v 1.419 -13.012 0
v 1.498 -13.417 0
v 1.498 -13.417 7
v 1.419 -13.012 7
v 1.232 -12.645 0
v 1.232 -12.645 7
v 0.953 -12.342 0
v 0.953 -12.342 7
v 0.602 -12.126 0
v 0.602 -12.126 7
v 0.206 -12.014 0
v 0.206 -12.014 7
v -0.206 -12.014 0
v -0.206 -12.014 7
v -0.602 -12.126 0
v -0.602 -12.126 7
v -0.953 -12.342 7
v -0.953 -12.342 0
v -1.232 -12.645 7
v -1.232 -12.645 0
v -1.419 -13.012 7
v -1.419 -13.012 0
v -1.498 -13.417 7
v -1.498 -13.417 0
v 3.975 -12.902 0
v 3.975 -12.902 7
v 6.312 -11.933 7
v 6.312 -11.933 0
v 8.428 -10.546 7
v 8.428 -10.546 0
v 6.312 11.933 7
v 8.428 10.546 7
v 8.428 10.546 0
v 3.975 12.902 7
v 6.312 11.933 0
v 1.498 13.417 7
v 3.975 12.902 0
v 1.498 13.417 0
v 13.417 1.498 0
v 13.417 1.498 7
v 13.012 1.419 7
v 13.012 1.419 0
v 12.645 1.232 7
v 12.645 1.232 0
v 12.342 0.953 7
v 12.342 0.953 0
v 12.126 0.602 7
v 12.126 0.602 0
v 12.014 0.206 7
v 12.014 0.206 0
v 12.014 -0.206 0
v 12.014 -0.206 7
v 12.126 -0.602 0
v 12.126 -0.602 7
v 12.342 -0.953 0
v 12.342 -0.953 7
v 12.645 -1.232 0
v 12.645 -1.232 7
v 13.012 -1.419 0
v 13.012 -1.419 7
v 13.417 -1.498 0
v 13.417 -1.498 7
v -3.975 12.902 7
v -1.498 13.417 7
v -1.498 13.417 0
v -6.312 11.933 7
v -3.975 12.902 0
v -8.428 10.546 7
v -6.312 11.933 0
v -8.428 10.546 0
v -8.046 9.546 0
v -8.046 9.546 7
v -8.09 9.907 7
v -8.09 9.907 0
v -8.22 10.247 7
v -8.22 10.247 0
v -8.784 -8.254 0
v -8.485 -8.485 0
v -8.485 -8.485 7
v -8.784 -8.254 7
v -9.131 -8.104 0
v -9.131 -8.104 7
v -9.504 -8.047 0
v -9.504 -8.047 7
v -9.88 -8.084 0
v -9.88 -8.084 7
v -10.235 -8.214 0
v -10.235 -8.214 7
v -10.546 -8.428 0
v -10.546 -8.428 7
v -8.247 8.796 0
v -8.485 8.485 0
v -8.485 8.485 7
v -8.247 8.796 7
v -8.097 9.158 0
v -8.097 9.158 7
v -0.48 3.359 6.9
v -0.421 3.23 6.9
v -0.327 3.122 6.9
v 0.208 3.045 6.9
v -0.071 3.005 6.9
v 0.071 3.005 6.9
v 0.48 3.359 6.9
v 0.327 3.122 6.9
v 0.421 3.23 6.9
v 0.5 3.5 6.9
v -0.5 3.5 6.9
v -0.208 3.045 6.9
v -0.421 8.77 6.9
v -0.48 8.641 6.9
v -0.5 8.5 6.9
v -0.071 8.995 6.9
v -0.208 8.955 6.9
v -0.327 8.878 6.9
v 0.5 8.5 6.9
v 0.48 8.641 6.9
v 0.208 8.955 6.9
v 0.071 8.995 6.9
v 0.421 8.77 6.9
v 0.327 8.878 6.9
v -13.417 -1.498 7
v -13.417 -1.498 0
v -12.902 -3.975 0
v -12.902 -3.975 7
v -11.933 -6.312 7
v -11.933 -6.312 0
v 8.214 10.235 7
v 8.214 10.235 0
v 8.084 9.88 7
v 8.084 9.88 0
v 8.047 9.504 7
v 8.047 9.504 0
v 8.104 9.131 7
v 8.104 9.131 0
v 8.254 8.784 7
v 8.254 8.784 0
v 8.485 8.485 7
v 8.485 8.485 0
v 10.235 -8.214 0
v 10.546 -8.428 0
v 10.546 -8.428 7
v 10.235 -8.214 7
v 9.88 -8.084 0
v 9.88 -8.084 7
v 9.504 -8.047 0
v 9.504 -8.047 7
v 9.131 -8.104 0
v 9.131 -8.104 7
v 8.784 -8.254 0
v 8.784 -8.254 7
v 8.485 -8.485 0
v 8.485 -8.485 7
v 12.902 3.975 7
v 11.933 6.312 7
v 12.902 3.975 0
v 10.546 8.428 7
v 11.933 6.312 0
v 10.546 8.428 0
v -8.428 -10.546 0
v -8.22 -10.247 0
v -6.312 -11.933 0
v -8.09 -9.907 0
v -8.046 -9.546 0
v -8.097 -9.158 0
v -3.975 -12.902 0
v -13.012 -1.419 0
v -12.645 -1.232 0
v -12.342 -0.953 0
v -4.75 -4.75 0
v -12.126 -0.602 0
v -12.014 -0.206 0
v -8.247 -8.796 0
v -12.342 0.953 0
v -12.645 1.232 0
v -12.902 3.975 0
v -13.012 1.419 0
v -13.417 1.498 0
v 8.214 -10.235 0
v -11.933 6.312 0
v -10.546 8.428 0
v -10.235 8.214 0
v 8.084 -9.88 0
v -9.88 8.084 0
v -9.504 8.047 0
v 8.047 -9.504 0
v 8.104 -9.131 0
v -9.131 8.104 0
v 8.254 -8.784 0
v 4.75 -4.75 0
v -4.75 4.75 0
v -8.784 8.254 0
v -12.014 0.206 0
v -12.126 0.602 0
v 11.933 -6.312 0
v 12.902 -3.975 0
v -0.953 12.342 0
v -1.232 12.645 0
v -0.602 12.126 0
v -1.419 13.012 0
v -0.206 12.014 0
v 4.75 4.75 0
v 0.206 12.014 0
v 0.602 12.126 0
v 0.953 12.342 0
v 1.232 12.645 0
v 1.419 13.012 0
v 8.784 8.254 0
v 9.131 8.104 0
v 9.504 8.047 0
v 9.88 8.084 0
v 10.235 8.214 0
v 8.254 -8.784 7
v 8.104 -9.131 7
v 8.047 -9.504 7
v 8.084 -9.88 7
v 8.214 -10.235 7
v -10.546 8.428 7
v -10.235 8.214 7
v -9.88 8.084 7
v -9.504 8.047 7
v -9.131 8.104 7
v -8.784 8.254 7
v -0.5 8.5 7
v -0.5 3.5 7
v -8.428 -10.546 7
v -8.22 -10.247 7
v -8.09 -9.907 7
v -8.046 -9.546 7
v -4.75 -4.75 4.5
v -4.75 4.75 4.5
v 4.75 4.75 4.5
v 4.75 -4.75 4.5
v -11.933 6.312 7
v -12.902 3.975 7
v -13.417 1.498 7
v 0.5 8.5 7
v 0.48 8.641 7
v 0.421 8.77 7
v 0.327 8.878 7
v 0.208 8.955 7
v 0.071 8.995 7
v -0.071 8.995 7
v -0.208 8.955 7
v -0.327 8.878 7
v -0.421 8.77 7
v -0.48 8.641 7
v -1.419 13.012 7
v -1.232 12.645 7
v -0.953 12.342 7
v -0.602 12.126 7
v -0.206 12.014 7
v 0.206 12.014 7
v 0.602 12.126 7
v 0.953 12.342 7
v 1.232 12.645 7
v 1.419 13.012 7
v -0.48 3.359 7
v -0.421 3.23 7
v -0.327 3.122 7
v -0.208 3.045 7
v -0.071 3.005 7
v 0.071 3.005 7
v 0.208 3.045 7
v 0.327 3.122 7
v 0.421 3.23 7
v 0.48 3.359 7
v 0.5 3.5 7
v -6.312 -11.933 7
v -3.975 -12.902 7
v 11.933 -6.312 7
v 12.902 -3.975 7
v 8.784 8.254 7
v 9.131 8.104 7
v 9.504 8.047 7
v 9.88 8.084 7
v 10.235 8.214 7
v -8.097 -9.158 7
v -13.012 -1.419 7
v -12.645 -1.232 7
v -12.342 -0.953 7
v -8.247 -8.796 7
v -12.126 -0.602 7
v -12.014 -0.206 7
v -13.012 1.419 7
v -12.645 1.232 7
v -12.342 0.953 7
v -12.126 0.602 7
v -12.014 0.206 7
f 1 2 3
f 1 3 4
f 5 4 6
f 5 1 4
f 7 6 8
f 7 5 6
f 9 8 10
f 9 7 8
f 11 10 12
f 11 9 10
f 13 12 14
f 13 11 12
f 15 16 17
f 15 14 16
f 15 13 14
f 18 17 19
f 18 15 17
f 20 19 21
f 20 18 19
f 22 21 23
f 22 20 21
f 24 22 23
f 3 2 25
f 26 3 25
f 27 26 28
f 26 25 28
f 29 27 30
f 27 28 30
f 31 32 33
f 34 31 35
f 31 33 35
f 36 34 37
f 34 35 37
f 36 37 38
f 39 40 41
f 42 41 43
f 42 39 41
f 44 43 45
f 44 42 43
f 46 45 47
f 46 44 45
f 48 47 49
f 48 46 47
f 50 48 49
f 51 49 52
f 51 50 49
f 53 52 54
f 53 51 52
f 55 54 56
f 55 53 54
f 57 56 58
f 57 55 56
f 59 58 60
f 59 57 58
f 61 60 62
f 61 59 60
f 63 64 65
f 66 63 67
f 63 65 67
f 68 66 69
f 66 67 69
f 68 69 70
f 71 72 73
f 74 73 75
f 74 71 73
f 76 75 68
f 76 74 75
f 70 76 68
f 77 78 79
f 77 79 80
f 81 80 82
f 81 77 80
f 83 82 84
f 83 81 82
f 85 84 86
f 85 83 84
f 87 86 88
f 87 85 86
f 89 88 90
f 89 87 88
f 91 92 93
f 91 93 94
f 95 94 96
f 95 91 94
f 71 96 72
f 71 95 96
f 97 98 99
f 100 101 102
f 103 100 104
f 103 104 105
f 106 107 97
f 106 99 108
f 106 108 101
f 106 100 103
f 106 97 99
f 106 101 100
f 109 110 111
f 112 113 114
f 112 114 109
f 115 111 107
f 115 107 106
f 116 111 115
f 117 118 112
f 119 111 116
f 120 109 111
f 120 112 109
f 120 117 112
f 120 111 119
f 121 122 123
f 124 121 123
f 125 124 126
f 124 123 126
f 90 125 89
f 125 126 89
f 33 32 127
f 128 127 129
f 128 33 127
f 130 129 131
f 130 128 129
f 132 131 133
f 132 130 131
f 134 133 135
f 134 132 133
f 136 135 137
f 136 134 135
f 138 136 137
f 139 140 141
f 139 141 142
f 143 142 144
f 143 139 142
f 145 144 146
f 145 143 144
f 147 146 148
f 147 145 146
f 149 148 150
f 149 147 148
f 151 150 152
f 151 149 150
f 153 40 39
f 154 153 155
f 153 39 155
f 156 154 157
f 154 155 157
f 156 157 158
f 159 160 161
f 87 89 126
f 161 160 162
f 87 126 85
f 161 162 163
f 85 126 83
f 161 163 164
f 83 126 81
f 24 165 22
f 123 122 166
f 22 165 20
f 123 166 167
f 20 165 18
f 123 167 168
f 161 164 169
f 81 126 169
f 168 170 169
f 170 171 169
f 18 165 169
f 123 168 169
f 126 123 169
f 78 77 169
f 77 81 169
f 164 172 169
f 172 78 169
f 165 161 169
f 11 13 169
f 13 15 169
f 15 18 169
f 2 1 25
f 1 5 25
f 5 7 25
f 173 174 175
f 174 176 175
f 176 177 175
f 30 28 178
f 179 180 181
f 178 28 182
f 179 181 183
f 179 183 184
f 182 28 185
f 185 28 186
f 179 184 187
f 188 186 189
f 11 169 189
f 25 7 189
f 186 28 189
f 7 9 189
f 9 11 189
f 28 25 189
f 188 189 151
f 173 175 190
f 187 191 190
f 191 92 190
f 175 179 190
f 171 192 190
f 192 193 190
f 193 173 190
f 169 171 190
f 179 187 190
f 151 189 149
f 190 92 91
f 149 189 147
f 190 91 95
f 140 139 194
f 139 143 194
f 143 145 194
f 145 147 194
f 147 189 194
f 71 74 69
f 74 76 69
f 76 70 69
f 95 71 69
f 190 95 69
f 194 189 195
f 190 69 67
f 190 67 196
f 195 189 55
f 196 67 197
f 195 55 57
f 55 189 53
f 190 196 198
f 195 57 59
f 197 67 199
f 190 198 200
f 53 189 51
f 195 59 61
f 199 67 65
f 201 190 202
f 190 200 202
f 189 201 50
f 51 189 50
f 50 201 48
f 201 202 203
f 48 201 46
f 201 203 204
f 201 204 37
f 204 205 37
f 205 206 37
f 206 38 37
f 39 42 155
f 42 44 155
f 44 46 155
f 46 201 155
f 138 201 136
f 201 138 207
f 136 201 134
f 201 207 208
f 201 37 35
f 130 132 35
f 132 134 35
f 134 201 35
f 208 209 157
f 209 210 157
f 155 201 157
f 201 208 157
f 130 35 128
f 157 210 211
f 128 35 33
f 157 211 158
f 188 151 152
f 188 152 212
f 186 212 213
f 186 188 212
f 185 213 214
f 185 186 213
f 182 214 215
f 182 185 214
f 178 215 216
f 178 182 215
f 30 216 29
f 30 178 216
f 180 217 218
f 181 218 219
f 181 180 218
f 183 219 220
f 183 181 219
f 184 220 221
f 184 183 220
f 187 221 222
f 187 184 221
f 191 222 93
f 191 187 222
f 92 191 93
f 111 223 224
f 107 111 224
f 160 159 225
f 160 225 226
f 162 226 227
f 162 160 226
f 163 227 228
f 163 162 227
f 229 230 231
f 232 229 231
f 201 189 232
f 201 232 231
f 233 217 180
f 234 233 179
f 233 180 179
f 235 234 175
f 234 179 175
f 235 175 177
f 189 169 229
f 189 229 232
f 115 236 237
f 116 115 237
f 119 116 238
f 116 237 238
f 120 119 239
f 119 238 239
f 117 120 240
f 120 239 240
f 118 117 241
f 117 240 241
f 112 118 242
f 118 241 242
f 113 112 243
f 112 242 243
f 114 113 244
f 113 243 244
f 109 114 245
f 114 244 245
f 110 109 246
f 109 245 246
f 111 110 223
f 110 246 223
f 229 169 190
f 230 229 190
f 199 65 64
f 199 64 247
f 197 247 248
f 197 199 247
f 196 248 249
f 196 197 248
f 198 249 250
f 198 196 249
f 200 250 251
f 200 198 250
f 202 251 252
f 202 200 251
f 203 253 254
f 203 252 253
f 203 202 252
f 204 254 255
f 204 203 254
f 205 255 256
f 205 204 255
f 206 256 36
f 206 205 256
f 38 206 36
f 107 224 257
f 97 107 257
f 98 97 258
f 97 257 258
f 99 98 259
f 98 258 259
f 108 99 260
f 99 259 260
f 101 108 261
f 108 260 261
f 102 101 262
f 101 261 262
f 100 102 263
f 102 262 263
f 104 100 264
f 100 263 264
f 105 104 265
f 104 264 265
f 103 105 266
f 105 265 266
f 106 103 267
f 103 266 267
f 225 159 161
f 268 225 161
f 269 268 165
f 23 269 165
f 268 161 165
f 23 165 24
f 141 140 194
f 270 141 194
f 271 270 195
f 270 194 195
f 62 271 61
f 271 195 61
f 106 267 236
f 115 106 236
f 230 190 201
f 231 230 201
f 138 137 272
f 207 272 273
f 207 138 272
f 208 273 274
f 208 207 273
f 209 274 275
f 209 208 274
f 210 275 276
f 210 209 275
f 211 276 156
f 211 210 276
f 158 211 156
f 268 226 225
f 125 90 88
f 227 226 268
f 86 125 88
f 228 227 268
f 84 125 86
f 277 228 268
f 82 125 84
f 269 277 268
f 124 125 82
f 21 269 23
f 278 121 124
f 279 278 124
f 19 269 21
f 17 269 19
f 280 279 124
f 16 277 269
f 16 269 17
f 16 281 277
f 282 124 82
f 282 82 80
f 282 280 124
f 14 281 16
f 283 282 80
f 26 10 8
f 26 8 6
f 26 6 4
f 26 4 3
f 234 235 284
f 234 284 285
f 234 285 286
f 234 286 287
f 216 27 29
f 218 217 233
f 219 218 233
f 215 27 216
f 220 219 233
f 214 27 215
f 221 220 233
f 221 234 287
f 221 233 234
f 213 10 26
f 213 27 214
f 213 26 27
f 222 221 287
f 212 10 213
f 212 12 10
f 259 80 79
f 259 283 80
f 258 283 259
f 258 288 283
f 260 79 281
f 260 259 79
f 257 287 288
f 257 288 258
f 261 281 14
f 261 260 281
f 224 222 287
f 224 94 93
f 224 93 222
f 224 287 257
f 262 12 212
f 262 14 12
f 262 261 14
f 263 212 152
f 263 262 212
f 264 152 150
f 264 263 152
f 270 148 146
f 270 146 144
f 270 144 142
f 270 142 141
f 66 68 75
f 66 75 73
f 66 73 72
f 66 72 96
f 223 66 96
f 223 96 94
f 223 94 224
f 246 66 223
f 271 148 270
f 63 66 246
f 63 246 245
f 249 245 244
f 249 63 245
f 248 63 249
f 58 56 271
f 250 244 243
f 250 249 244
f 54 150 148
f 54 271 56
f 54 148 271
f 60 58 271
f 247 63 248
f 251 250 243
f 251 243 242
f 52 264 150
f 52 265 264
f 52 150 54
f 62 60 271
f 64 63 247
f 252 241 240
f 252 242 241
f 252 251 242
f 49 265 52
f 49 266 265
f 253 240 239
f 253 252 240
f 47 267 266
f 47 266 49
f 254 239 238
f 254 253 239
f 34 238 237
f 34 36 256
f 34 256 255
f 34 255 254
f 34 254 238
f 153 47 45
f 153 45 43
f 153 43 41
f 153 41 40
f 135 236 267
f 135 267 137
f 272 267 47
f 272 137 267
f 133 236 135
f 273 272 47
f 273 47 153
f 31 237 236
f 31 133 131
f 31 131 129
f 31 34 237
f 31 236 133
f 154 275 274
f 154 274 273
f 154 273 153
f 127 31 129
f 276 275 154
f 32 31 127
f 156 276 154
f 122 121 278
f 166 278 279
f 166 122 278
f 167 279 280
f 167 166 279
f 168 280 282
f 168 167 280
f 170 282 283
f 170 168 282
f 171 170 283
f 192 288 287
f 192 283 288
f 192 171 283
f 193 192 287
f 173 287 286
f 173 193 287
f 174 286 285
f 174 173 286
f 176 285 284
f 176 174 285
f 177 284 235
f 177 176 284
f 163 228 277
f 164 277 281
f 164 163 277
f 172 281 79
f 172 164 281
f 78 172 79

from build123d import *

# Parameters (mm, degrees)
F0_R     = 13.5
F1_DEPTH = 7
F2_W     = 9.5
F2_H     = 9.5
F3_DEPTH = 4.5
F4_R     = 1.5
F5_DEPTH = 25.4
F8_DEPTH = 0.1


with BuildPart() as f1:
    # F0 (on Top) → F1 (new body)
    with BuildSketch(Plane.XY):
        Circle(F0_R)
    extrude(amount=F1_DEPTH)

    # F2 (on Top) → F3 (cut)
    with BuildSketch(Plane.XY):
        Rectangle(F2_W, F2_H)
    extrude(amount=F3_DEPTH, mode=Mode.SUBTRACT)

    # F4 (on Top) → F5 (cut)
    with BuildSketch(Plane.XY):
        with Locations((13.5, 0)):
            Circle(F4_R)
        with Locations((-13.5, 0)):
            Circle(F4_R)
        with Locations((0, -13.5)):
            Circle(F4_R)
        with Locations((0, 13.5)):
            Circle(F4_R)
        with BuildLine():
            ThreePointArc((-8.045941546, 9.545941546), (-8.9719163975, 10.9317608448), (-10.6066017178, 10.6066017178))
            Line((-10.6066017178, 10.6066017178), (-8.4852813742, 8.4852813742))
            ThreePointArc((-8.4852813742, 8.4852813742), (-8.1601222473, 8.9719163975), (-8.045941546, 9.545941546))
        make_face()
        with BuildLine():
            ThreePointArc((10.6066017178, 10.6066017178), (8.4852813742, 10.6066017178), (8.4852813742, 8.4852813742))
            Line((8.4852813742, 8.4852813742), (10.6066017178, 10.6066017178))
        make_face()
        with BuildLine():
            Line((10.6066017178, 10.6066017178), (8.4852813742, 8.4852813742))
            ThreePointArc((8.4852813742, 8.4852813742), (10.1199666946, 8.1601222473), (11.045941546, 9.545941546))
            ThreePointArc((11.045941546, 9.545941546), (10.9317608448, 10.1199666946), (10.6066017178, 10.6066017178))
        make_face()
        with BuildLine():
            ThreePointArc((11.045941546, -9.545941546), (10.1199666946, -8.1601222473), (8.4852813742, -8.4852813742))
            Line((8.4852813742, -8.4852813742), (10.6066017178, -10.6066017178))
            ThreePointArc((10.6066017178, -10.6066017178), (10.9317608448, -10.1199666946), (11.045941546, -9.545941546))
        make_face()
        with BuildLine():
            Line((10.6066017178, -10.6066017178), (8.4852813742, -8.4852813742))
            ThreePointArc((8.4852813742, -8.4852813742), (8.4852813742, -10.6066017178), (10.6066017178, -10.6066017178))
        make_face()
        with BuildLine():
            ThreePointArc((-8.045941546, -9.545941546), (-8.1601222473, -8.9719163975), (-8.4852813742, -8.4852813742))
            Line((-8.4852813742, -8.4852813742), (-10.6066017178, -10.6066017178))
            ThreePointArc((-10.6066017178, -10.6066017178), (-8.9719163975, -10.9317608448), (-8.045941546, -9.545941546))
        make_face()
        with BuildLine():
            Line((-10.6066017178, -10.6066017178), (-8.4852813742, -8.4852813742))
            ThreePointArc((-8.4852813742, -8.4852813742), (-10.6066017178, -8.4852813742), (-10.6066017178, -10.6066017178))
        make_face()
        with BuildLine():
            Line((-8.4852813742, 8.4852813742), (-10.6066017178, 10.6066017178))
            ThreePointArc((-10.6066017178, 10.6066017178), (-10.6066017178, 8.4852813742), (-8.4852813742, 8.4852813742))
        make_face()
    extrude(amount=F5_DEPTH, mode=Mode.SUBTRACT)

    # F7 (on offset) → F8 (cut)
    with BuildSketch(Plane.XY.offset(7)):
        with BuildLine():
            ThreePointArc((-0.5, 8.5), (0, 8), (0.5, 8.5))
            Line((0.5, 8.5), (-0.5, 8.5))
        make_face()
        with BuildLine():
            Line((-0.5, 8.5), (0.5, 8.5))
            ThreePointArc((0.5, 8.5), (0, 9), (-0.5, 8.5))
        make_face()
        with BuildLine():
            Line((0.5, 3.5), (0.5, 8.5))
            ThreePointArc((0.5, 8.5), (0, 8), (-0.5, 8.5))
            Line((-0.5, 8.5), (-0.5, 3.5))
            ThreePointArc((-0.5, 3.5), (0, 4), (0.5, 3.5))
        make_face()
        with BuildLine():
            ThreePointArc((-0.5, 3.5), (0, 3), (0.5, 3.5))
            Line((0.5, 3.5), (-0.5, 3.5))
        make_face()
        with BuildLine():
            Line((-0.5, 3.5), (0.5, 3.5))
            ThreePointArc((0.5, 3.5), (0, 4), (-0.5, 3.5))
        make_face()
    extrude(amount=-F8_DEPTH, mode=Mode.SUBTRACT)


solid = f1.part
